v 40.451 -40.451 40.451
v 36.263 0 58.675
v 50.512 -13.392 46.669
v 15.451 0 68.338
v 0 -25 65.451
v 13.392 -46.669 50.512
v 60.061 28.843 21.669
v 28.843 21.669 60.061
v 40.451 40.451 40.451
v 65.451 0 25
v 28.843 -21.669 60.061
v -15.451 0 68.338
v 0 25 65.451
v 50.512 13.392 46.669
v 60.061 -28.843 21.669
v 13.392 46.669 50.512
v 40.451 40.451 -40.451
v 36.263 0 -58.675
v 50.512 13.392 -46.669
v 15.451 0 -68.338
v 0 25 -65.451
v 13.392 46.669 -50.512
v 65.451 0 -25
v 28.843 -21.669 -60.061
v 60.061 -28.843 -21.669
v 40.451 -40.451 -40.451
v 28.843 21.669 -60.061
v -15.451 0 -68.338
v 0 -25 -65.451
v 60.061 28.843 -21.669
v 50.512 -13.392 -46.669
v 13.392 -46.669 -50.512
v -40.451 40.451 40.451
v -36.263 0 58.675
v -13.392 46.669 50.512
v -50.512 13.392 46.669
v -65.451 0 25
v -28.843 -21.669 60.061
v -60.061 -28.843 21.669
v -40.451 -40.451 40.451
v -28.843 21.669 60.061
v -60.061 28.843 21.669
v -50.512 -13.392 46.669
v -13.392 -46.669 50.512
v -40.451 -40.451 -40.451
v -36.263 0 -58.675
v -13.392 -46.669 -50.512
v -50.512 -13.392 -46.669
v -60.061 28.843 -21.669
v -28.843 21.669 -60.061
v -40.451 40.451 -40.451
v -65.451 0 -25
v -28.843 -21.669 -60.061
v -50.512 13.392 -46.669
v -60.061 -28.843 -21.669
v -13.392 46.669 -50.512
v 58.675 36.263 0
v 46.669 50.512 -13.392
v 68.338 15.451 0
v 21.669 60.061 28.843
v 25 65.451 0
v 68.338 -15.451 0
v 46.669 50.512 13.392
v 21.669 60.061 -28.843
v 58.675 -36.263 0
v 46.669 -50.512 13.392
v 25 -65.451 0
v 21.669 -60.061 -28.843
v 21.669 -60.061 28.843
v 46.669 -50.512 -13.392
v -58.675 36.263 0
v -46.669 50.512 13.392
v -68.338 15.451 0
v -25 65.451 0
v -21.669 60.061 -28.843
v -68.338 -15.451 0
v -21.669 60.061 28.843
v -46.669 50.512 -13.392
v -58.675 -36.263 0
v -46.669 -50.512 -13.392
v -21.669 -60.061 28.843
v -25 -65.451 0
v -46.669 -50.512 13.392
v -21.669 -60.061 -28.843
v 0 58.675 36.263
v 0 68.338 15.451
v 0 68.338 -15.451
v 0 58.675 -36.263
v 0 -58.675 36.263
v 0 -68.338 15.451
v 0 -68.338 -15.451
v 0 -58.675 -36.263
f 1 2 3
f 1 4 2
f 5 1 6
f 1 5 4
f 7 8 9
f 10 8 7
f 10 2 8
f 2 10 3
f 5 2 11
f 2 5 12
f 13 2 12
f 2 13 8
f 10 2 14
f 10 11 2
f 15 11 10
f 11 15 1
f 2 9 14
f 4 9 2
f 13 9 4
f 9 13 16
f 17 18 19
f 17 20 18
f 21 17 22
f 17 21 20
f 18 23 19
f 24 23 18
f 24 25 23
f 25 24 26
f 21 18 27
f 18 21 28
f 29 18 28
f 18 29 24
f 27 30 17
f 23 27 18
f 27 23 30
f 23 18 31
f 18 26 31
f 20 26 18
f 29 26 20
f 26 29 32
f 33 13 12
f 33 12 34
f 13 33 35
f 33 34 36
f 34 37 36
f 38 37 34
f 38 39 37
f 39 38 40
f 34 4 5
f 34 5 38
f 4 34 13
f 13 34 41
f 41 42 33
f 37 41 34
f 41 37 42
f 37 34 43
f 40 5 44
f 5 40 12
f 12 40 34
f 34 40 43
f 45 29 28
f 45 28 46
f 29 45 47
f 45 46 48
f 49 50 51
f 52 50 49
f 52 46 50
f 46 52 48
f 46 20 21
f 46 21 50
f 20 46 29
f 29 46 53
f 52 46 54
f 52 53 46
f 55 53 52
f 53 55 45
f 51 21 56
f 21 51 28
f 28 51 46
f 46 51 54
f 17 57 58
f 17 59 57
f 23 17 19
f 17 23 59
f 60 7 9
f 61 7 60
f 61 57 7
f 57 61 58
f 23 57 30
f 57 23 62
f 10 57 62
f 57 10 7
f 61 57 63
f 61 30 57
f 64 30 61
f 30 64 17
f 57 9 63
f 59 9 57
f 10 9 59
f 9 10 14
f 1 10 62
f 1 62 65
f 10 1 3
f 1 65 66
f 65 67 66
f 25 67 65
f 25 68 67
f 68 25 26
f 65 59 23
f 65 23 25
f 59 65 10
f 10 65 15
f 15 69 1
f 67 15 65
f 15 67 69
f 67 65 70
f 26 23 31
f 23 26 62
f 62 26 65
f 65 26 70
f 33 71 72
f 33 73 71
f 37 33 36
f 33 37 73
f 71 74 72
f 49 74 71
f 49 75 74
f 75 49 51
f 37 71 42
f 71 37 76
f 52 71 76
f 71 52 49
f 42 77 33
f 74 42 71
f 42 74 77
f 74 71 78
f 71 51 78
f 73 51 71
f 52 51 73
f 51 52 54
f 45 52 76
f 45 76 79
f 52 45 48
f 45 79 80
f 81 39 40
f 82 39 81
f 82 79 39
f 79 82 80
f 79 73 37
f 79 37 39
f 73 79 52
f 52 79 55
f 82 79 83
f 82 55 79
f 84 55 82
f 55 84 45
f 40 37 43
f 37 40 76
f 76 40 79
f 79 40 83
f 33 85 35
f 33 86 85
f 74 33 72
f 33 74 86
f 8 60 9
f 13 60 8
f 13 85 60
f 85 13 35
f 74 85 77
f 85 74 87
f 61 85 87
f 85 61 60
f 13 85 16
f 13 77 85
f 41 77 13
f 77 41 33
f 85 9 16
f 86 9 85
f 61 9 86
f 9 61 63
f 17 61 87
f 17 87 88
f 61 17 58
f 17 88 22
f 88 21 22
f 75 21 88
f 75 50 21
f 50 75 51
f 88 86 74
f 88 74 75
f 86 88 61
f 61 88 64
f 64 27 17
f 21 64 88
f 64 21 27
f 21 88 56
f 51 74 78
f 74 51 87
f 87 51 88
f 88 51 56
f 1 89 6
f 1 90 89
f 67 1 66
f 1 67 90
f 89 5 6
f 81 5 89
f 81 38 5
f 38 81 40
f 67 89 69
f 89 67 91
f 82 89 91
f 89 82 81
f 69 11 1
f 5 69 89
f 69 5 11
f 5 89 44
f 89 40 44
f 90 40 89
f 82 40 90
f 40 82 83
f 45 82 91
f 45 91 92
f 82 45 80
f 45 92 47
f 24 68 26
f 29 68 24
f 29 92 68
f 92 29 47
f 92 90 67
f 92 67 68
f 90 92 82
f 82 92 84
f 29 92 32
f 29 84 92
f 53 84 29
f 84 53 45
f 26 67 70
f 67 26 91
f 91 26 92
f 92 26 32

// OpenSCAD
// Small Hexagonal Hexecontahedron
//   coords via: http://dmccooey.com/polyhedra/SmallHexagonalHexecontahedron.txt
//
scaling_factor = 50;

C0  = (1 - sqrt(5) + sqrt(2 * (3 * sqrt(5) - 1))) / 8;
C1  = (sqrt(5) - 1) / 4;
C2  = (sqrt(3 + 2 * sqrt(5)) - 1) / 4;
C3  = (sqrt(5) - 1 + sqrt(2 * (3 * sqrt(5) - 1))) / 8;
C4  = (1 + sqrt(5) + 2 * sqrt(3 + 2 * sqrt(5))) / 12;
C5  = (1 + sqrt(5)) / 4;
C6  = (1 + sqrt(3 + 2 * sqrt(5))) / 4;
C7  = (sqrt(5) - 3 + sqrt(2 * (19 + 9 * sqrt(5)))) / 8;
C8  = (3 + sqrt(5) + sqrt(2 * (19 + 9 * sqrt(5)))) / 12;
C9  = (3 - sqrt(5) + sqrt(2 * (19 + 9 * sqrt(5)))) / 8;
C10 = (3 + sqrt(5)) / 4;
C11 = sqrt(3 + 2 * sqrt(5)) / 2;

vertices = [
 [  C1,  0.0,  C11], [  C1,  0.0, -C11], [ -C1,  0.0,  C11], [ -C1,  0.0, -C11],
 [ C11,   C1,  0.0], [ C11,  -C1,  0.0], [-C11,   C1,  0.0], [-C11,  -C1,  0.0],
 [ 0.0,  C11,   C1], [ 0.0,  C11,  -C1], [ 0.0, -C11,   C1], [ 0.0, -C11,  -C1],
 [ 0.0,  0.5,  C10], [ 0.0,  0.5,  C10], [ 0.0,  0.5, -C10], [ 0.0,  0.5, -C10],
 [ 0.0, -0.5,  C10], [ 0.0, -0.5,  C10], [ 0.0, -0.5, -C10], [ 0.0, -0.5, -C10],
 [ C10,  0.0,  0.5], [ C10,  0.0,  0.5], [ C10,  0.0, -0.5], [ C10,  0.0, -0.5],
 [-C10,  0.0,  0.5], [-C10,  0.0,  0.5], [-C10,  0.0, -0.5], [-C10,  0.0, -0.5],
 [ 0.5,  C10,  0.0], [ 0.5,  C10,  0.0], [ 0.5, -C10,  0.0], [ 0.5, -C10,  0.0],
 [-0.5,  C10,  0.0], [-0.5,  C10,  0.0], [-0.5, -C10,  0.0], [-0.5, -C10,  0.0],
 [  C3,   C2,   C9], [  C3,   C2,  -C9], [  C3,  -C2,   C9], [  C3,  -C2,  -C9],
 [ -C3,   C2,   C9], [ -C3,   C2,  -C9], [ -C3,  -C2,   C9], [ -C3,  -C2,  -C9],
 [  C9,   C3,   C2], [  C9,   C3,  -C2], [  C9,  -C3,   C2], [  C9,  -C3,  -C2],
 [ -C9,   C3,   C2], [ -C9,   C3,  -C2], [ -C9,  -C3,   C2], [ -C9,  -C3,  -C2],
 [  C2,   C9,   C3], [  C2,   C9,  -C3], [  C2,  -C9,   C3], [  C2,  -C9,  -C3],
 [ -C2,   C9,   C3], [ -C2,   C9,  -C3], [ -C2,  -C9,   C3], [ -C2,  -C9,  -C3],
 [  C4,  0.0,   C8], [  C4,  0.0,  -C8], [ -C4,  0.0,   C8], [ -C4,  0.0,  -C8],
 [  C8,   C4,  0.0], [  C8,  -C4,  0.0], [ -C8,   C4,  0.0], [ -C8,  -C4,  0.0],
 [ 0.0,   C8,   C4], [ 0.0,   C8,  -C4], [ 0.0,  -C8,   C4], [ 0.0,  -C8,  -C4],
 [  C0,   C6,   C7], [  C0,   C6,  -C7], [  C0,  -C6,   C7], [  C0,  -C6,  -C7],
 [ -C0,   C6,   C7], [ -C0,   C6,  -C7], [ -C0,  -C6,   C7], [ -C0,  -C6,  -C7],
 [  C7,   C0,   C6], [  C7,   C0,  -C6], [  C7,  -C0,   C6], [  C7,  -C0,  -C6],
 [ -C7,   C0,   C6], [ -C7,   C0,  -C6], [ -C7,  -C0,   C6], [ -C7,  -C0,  -C6],
 [  C6,   C7,   C0], [  C6,   C7,  -C0], [  C6,  -C7,   C0], [  C6,  -C7,  -C0],
 [ -C6,   C7,   C0], [ -C6,   C7,  -C0], [ -C6,  -C7,   C0], [ -C6,  -C7,  -C0],
 [  C5,   C5,   C5], [  C5,   C5,   C5], [  C5,   C5,  -C5], [  C5,   C5,  -C5],
 [  C5,  -C5,   C5], [  C5,  -C5,   C5], [  C5,  -C5,  -C5], [  C5,  -C5,  -C5],
 [ -C5,   C5,   C5], [ -C5,   C5,   C5], [ -C5,   C5,  -C5], [ -C5,   C5,  -C5],
 [ -C5,  -C5,   C5], [ -C5,  -C5,   C5], [ -C5,  -C5,  -C5], [ -C5,  -C5,  -C5]
];

faces = [
  [ 60,   0,  17,  74, 100,  82], [ 60,  82,  20,  44,  97,  36],
  [ 60,  36,  12,   2,  16,  38], [ 60,  38, 101,  46,  21,  80],
  [ 60,  80,  96,  72,  13,   0],
  [ 61,   1,  15,  73,  98,  81], [ 61,  81,  22,  47, 103,  39],
  [ 61,  39,  18,   3,  14,  37], [ 61,  37,  99,  45,  23,  83],
  [ 61,  83, 102,  75,  19,   1],
  [ 62,   2,  12,  76, 104,  84], [ 62,  84,  25,  50, 109,  42],
  [ 62,  42,  17,   0,  13,  40], [ 62,  40, 105,  48,  24,  86],
  [ 62,  86, 108,  78,  16,   2],
  [ 63,   3,  18,  79, 110,  87], [ 63,  87,  27,  49, 107,  41],
  [ 63,  41,  15,   1,  19,  43], [ 63,  43, 111,  51,  26,  85],
  [ 63,  85, 106,  77,  14,   3],
  [ 64,   4,  22,  81,  98,  89], [ 64,  89,  29,  52,  97,  44],
  [ 64,  44,  20,   5,  23,  45], [ 64,  45,  99,  53,  28,  88],
  [ 64,  88,  96,  80,  21,   4],
  [ 65,   5,  20,  82, 100,  90], [ 65,  90,  31,  55, 103,  47],
  [ 65,  47,  22,   4,  21,  46], [ 65,  46, 101,  54,  30,  91],
  [ 65,  91, 102,  83,  23,   5],
  [ 66,   6,  25,  84, 104,  92], [ 66,  92,  32,  57, 107,  49],
  [ 66,  49,  27,   7,  24,  48], [ 66,  48, 105,  56,  33,  93],
  [ 66,  93, 106,  85,  26,   6],
  [ 67,   7,  27,  87, 110,  95], [ 67,  95,  34,  58, 109,  50],
  [ 67,  50,  25,   6,  26,  51], [ 67,  51, 111,  59,  35,  94],
  [ 67,  94, 108,  86,  24,   7],
  [ 68,   8,  32,  92, 104,  76], [ 68,  76,  12,  36,  97,  52],
  [ 68,  52,  29,   9,  33,  56], [ 68,  56, 105,  40,  13,  72],
  [ 68,  72,  96,  88,  28,   8],
  [ 69,   9,  29,  89,  98,  73], [ 69,  73,  15,  41, 107,  57],
  [ 69,  57,  32,   8,  28,  53], [ 69,  53,  99,  37,  14,  77],
  [ 69,  77, 106,  93,  33,   9],
  [ 70,  10,  31,  90, 100,  74], [ 70,  74,  17,  42, 109,  58],
  [ 70,  58,  34,  11,  30,  54], [ 70,  54, 101,  38,  16,  78],
  [ 70,  78, 108,  94,  35,  10],
  [ 71,  11,  34,  95, 110,  79], [ 71,  79,  18,  39, 103,  55],
  [ 71,  55,  31,  10,  35,  59], [ 71,  59, 111,  43,  19,  75],
  [ 71,  75, 102,  91,  30,  11]
];

scale(scaling_factor) {
  polyhedron(points=vertices, faces=faces, convexity=20);
};
